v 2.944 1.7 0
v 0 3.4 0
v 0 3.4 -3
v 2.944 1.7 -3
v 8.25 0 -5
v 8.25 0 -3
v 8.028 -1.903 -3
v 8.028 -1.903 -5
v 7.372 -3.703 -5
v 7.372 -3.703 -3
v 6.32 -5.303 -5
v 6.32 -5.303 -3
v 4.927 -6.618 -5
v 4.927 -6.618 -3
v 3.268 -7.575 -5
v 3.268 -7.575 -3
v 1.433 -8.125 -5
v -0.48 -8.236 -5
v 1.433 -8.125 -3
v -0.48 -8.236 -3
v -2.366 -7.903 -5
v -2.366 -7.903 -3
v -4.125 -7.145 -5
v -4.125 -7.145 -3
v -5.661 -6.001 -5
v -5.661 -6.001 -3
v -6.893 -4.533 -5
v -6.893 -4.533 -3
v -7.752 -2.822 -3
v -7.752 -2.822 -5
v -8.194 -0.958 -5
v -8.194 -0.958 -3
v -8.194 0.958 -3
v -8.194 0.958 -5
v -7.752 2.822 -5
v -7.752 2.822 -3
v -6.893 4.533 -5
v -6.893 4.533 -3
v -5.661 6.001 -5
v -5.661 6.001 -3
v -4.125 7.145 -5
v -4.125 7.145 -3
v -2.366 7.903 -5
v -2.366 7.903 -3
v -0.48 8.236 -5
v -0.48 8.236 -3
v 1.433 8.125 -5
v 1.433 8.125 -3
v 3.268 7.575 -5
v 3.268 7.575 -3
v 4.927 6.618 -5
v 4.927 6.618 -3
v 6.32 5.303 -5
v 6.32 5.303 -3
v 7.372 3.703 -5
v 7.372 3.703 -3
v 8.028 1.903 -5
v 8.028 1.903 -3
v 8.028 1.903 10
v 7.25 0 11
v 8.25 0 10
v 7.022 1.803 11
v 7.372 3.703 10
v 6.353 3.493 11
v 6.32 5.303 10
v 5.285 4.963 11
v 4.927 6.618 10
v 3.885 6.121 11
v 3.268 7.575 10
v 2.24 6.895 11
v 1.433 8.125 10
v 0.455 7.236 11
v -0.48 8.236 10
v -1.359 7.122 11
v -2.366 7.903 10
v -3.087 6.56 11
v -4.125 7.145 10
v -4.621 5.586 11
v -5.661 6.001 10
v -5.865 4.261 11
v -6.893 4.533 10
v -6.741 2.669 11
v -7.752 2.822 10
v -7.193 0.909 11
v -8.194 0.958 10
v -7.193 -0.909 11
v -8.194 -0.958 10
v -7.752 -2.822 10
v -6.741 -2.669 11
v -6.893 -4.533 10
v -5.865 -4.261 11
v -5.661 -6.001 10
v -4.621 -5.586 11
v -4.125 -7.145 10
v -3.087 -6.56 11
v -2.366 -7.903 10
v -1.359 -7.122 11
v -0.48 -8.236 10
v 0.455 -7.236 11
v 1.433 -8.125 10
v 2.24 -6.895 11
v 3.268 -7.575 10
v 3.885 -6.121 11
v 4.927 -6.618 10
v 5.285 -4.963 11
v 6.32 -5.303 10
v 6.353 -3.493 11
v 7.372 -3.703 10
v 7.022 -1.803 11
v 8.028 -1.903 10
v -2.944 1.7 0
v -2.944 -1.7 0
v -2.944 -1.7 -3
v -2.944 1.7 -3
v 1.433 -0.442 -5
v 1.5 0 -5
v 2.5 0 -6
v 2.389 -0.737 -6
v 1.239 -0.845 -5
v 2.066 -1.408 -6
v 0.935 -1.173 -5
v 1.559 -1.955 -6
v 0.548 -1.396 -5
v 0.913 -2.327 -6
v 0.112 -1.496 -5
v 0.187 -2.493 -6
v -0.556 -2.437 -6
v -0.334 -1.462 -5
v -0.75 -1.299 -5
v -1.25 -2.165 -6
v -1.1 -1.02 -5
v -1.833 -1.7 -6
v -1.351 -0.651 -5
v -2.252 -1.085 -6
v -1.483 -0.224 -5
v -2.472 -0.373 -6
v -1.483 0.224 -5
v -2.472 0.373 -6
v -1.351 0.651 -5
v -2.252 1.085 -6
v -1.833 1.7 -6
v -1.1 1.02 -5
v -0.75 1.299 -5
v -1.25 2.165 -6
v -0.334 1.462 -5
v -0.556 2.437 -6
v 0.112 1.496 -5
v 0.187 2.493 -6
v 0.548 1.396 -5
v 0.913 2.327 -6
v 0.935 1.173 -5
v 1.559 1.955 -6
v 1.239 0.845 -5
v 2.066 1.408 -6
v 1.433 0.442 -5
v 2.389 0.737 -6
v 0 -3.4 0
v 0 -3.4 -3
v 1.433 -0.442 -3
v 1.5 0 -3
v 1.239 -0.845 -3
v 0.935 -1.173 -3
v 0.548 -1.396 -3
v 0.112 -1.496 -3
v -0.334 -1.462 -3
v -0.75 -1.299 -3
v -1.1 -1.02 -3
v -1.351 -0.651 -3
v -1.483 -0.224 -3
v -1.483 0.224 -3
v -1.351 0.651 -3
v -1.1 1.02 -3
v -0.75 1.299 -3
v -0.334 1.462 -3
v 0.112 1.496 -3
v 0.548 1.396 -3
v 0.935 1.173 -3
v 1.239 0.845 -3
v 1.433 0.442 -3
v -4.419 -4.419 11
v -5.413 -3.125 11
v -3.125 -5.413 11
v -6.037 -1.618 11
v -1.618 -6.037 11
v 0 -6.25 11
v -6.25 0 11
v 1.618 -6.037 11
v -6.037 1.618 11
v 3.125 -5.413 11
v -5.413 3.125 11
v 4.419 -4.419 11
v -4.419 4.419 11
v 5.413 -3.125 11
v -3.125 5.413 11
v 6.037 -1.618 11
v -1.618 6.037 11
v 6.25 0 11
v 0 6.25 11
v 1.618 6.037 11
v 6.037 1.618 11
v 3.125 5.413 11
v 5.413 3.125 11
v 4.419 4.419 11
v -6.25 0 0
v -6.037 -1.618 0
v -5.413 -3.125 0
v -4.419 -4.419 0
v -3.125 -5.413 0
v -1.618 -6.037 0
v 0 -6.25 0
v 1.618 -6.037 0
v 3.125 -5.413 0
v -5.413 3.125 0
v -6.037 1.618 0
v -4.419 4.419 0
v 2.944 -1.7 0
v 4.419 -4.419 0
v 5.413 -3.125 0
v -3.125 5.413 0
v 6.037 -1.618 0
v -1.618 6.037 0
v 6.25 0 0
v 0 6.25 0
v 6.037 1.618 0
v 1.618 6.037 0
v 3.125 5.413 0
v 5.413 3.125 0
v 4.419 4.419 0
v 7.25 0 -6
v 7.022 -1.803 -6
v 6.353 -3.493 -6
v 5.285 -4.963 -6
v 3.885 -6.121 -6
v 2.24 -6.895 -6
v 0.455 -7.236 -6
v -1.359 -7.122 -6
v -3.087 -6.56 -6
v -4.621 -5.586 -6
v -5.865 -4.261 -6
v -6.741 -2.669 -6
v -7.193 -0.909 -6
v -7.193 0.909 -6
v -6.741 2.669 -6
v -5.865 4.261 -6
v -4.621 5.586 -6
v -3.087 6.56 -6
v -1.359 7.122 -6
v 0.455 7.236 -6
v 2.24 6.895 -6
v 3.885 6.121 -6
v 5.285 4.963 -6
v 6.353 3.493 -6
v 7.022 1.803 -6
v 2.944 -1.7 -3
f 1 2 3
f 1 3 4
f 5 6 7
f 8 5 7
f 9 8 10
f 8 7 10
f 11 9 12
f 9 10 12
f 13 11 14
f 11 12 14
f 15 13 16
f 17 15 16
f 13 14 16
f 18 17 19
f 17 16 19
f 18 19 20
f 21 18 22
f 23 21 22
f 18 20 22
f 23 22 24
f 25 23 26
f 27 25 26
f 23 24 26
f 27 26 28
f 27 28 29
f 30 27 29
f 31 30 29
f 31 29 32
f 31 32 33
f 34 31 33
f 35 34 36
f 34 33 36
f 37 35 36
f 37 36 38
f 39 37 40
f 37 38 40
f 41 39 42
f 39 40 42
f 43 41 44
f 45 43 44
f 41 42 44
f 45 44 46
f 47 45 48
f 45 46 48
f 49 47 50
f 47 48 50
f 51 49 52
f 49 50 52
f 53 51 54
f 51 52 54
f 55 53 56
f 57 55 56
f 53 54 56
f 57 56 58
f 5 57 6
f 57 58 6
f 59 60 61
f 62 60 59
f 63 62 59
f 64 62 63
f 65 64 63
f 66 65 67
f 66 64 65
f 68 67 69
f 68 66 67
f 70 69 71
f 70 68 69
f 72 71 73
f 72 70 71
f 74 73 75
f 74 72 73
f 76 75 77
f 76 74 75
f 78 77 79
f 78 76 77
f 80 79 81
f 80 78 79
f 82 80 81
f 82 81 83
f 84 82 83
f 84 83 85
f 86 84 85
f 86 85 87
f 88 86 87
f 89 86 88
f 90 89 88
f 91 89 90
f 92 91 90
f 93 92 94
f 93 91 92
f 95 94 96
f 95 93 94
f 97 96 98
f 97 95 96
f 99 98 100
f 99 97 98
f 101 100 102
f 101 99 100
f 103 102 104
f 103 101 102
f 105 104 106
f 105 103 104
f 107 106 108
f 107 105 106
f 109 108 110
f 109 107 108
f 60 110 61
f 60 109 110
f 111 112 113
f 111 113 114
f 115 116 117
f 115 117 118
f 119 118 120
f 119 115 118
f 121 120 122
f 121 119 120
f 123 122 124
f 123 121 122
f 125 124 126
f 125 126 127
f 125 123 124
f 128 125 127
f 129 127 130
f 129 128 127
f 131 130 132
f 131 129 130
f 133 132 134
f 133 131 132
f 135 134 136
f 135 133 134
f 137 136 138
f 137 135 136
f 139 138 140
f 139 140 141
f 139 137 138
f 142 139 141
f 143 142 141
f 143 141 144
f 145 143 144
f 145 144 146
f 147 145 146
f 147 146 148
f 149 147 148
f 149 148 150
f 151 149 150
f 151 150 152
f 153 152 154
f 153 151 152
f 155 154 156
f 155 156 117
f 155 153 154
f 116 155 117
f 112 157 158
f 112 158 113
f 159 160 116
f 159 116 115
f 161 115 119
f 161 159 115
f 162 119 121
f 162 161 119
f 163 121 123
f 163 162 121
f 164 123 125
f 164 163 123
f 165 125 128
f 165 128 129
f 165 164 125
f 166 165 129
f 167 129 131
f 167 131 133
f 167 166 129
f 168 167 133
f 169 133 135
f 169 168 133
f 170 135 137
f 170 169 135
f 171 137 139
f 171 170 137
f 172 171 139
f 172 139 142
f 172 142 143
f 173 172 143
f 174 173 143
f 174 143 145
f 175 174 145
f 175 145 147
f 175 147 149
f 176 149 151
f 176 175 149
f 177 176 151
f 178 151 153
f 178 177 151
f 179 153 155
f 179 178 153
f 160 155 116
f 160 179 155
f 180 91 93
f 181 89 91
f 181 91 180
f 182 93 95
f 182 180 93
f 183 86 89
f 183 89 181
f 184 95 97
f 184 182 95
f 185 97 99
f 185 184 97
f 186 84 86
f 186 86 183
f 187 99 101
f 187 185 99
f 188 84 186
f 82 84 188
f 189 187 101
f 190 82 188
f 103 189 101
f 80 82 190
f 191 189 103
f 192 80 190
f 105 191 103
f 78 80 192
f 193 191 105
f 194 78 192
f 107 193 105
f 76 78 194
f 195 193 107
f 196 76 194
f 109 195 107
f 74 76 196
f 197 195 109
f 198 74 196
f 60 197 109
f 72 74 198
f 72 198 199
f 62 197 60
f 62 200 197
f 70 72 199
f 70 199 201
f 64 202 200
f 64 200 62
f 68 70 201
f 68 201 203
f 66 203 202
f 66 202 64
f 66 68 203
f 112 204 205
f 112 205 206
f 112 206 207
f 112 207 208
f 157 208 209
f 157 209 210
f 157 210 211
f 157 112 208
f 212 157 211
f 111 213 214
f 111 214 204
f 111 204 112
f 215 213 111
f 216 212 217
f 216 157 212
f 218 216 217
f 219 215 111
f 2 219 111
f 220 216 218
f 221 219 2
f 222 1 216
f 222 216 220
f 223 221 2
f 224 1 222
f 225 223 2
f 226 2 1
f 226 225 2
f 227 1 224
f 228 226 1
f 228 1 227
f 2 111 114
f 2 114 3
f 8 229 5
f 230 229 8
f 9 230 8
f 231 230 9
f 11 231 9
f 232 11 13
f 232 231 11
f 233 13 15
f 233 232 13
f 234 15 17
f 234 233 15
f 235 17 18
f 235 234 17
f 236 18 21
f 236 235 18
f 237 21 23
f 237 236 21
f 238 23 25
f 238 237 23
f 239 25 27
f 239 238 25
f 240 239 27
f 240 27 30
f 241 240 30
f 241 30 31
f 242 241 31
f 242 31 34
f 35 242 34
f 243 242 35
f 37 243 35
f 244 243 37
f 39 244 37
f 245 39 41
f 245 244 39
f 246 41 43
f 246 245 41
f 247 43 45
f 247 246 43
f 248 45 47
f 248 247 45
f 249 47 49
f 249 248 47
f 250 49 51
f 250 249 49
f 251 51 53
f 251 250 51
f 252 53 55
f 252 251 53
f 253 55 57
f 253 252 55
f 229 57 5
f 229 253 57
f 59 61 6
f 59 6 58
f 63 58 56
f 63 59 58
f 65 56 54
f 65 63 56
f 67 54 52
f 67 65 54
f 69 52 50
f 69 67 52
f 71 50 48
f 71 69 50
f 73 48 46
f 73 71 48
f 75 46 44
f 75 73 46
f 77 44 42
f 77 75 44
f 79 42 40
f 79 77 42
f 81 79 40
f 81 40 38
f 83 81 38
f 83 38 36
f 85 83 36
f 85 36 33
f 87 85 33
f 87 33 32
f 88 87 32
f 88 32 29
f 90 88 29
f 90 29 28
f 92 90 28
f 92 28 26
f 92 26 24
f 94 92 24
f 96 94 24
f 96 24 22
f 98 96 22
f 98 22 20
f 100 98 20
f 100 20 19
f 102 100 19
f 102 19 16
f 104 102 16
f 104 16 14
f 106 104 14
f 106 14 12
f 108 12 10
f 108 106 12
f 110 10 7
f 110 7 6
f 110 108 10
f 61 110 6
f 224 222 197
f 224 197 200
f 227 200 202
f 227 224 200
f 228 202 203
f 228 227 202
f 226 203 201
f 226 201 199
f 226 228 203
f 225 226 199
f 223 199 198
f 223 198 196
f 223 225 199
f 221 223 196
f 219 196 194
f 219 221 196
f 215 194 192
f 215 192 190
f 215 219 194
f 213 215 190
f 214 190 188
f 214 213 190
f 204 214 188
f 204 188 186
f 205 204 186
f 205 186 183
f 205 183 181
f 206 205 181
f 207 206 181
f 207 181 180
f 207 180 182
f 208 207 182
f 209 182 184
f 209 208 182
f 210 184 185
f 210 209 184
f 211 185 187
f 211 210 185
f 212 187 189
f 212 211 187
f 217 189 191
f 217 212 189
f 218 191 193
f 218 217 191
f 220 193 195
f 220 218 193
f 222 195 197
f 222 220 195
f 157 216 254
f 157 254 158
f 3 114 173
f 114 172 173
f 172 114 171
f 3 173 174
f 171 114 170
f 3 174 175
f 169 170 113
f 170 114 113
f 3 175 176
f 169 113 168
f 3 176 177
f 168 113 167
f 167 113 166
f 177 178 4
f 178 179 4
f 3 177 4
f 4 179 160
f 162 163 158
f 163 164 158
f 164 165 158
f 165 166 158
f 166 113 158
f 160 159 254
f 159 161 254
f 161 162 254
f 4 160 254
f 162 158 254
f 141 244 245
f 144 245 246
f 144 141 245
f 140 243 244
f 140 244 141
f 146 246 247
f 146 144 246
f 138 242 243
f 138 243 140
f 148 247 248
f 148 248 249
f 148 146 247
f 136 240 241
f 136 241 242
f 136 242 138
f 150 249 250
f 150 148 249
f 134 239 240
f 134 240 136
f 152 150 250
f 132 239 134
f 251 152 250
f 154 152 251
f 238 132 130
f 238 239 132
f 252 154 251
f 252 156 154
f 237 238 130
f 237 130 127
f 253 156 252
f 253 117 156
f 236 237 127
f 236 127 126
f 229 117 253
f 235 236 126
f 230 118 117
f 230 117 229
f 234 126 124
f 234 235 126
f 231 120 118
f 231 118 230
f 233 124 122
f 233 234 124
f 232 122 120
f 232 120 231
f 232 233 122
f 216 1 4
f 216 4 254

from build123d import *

# Parameters (mm, degrees)
F0_R     = 8.25
F0_R_2   = 6.25
F1_DEPTH = 11
F2_DEPTH = 3
F3_R     = 8.25
F3_R_2   = 1.5
F4_DEPTH = 3
F5_SIZE  = 1


with BuildPart() as f1:
    # F0 (on Top) → F1 (new body)
    with BuildSketch(Plane.XY):
        Circle(F0_R)
        Circle(F0_R_2, mode=Mode.SUBTRACT)
    extrude(amount=F1_DEPTH)

    # F0 (on Top) → F2 (join)
    with BuildSketch(Plane.XY):
        Circle(F0_R)
        Circle(F0_R_2, mode=Mode.SUBTRACT)
        Circle(F0_R_2)
        Polygon((2.9444863729, -1.7), (0, -3.4), (-2.9444863729, -1.7), (-2.9444863729, 1.7), (0, 3.4), (2.9444863729, 1.7), align=None, mode=Mode.SUBTRACT)
    extrude(amount=-F2_DEPTH)

    # F3 (on face) → F4 (join)
    with BuildSketch(Plane(origin=(0, 0, -3), x_dir=(1, 0, 0), z_dir=(0, 0, -1))):
        Circle(F3_R)
        Polygon((0, 3.4), (2.9444863729, 1.7), (2.9444863729, -1.7), (0, -3.4), (-2.9444863729, -1.7), (-2.9444863729, 1.7), align=None, mode=Mode.SUBTRACT)
        Polygon((2.9444863729, -1.7), (2.9444863729, 1.7), (0, 3.4), (-2.9444863729, 1.7), (-2.9444863729, -1.7), (0, -3.4), align=None)
        Circle(F3_R_2, mode=Mode.SUBTRACT)
    extrude(amount=F4_DEPTH)

    # F5
    f5_edges = [f1.edges().sort_by_distance(p)[0] for p in [
        (-8.25, 0, 11),
        (-8.25, 0, -6),
        (-1.5, 0, -6),
    ]]
    chamfer(f5_edges, length=F5_SIZE)


solid = f1.part
